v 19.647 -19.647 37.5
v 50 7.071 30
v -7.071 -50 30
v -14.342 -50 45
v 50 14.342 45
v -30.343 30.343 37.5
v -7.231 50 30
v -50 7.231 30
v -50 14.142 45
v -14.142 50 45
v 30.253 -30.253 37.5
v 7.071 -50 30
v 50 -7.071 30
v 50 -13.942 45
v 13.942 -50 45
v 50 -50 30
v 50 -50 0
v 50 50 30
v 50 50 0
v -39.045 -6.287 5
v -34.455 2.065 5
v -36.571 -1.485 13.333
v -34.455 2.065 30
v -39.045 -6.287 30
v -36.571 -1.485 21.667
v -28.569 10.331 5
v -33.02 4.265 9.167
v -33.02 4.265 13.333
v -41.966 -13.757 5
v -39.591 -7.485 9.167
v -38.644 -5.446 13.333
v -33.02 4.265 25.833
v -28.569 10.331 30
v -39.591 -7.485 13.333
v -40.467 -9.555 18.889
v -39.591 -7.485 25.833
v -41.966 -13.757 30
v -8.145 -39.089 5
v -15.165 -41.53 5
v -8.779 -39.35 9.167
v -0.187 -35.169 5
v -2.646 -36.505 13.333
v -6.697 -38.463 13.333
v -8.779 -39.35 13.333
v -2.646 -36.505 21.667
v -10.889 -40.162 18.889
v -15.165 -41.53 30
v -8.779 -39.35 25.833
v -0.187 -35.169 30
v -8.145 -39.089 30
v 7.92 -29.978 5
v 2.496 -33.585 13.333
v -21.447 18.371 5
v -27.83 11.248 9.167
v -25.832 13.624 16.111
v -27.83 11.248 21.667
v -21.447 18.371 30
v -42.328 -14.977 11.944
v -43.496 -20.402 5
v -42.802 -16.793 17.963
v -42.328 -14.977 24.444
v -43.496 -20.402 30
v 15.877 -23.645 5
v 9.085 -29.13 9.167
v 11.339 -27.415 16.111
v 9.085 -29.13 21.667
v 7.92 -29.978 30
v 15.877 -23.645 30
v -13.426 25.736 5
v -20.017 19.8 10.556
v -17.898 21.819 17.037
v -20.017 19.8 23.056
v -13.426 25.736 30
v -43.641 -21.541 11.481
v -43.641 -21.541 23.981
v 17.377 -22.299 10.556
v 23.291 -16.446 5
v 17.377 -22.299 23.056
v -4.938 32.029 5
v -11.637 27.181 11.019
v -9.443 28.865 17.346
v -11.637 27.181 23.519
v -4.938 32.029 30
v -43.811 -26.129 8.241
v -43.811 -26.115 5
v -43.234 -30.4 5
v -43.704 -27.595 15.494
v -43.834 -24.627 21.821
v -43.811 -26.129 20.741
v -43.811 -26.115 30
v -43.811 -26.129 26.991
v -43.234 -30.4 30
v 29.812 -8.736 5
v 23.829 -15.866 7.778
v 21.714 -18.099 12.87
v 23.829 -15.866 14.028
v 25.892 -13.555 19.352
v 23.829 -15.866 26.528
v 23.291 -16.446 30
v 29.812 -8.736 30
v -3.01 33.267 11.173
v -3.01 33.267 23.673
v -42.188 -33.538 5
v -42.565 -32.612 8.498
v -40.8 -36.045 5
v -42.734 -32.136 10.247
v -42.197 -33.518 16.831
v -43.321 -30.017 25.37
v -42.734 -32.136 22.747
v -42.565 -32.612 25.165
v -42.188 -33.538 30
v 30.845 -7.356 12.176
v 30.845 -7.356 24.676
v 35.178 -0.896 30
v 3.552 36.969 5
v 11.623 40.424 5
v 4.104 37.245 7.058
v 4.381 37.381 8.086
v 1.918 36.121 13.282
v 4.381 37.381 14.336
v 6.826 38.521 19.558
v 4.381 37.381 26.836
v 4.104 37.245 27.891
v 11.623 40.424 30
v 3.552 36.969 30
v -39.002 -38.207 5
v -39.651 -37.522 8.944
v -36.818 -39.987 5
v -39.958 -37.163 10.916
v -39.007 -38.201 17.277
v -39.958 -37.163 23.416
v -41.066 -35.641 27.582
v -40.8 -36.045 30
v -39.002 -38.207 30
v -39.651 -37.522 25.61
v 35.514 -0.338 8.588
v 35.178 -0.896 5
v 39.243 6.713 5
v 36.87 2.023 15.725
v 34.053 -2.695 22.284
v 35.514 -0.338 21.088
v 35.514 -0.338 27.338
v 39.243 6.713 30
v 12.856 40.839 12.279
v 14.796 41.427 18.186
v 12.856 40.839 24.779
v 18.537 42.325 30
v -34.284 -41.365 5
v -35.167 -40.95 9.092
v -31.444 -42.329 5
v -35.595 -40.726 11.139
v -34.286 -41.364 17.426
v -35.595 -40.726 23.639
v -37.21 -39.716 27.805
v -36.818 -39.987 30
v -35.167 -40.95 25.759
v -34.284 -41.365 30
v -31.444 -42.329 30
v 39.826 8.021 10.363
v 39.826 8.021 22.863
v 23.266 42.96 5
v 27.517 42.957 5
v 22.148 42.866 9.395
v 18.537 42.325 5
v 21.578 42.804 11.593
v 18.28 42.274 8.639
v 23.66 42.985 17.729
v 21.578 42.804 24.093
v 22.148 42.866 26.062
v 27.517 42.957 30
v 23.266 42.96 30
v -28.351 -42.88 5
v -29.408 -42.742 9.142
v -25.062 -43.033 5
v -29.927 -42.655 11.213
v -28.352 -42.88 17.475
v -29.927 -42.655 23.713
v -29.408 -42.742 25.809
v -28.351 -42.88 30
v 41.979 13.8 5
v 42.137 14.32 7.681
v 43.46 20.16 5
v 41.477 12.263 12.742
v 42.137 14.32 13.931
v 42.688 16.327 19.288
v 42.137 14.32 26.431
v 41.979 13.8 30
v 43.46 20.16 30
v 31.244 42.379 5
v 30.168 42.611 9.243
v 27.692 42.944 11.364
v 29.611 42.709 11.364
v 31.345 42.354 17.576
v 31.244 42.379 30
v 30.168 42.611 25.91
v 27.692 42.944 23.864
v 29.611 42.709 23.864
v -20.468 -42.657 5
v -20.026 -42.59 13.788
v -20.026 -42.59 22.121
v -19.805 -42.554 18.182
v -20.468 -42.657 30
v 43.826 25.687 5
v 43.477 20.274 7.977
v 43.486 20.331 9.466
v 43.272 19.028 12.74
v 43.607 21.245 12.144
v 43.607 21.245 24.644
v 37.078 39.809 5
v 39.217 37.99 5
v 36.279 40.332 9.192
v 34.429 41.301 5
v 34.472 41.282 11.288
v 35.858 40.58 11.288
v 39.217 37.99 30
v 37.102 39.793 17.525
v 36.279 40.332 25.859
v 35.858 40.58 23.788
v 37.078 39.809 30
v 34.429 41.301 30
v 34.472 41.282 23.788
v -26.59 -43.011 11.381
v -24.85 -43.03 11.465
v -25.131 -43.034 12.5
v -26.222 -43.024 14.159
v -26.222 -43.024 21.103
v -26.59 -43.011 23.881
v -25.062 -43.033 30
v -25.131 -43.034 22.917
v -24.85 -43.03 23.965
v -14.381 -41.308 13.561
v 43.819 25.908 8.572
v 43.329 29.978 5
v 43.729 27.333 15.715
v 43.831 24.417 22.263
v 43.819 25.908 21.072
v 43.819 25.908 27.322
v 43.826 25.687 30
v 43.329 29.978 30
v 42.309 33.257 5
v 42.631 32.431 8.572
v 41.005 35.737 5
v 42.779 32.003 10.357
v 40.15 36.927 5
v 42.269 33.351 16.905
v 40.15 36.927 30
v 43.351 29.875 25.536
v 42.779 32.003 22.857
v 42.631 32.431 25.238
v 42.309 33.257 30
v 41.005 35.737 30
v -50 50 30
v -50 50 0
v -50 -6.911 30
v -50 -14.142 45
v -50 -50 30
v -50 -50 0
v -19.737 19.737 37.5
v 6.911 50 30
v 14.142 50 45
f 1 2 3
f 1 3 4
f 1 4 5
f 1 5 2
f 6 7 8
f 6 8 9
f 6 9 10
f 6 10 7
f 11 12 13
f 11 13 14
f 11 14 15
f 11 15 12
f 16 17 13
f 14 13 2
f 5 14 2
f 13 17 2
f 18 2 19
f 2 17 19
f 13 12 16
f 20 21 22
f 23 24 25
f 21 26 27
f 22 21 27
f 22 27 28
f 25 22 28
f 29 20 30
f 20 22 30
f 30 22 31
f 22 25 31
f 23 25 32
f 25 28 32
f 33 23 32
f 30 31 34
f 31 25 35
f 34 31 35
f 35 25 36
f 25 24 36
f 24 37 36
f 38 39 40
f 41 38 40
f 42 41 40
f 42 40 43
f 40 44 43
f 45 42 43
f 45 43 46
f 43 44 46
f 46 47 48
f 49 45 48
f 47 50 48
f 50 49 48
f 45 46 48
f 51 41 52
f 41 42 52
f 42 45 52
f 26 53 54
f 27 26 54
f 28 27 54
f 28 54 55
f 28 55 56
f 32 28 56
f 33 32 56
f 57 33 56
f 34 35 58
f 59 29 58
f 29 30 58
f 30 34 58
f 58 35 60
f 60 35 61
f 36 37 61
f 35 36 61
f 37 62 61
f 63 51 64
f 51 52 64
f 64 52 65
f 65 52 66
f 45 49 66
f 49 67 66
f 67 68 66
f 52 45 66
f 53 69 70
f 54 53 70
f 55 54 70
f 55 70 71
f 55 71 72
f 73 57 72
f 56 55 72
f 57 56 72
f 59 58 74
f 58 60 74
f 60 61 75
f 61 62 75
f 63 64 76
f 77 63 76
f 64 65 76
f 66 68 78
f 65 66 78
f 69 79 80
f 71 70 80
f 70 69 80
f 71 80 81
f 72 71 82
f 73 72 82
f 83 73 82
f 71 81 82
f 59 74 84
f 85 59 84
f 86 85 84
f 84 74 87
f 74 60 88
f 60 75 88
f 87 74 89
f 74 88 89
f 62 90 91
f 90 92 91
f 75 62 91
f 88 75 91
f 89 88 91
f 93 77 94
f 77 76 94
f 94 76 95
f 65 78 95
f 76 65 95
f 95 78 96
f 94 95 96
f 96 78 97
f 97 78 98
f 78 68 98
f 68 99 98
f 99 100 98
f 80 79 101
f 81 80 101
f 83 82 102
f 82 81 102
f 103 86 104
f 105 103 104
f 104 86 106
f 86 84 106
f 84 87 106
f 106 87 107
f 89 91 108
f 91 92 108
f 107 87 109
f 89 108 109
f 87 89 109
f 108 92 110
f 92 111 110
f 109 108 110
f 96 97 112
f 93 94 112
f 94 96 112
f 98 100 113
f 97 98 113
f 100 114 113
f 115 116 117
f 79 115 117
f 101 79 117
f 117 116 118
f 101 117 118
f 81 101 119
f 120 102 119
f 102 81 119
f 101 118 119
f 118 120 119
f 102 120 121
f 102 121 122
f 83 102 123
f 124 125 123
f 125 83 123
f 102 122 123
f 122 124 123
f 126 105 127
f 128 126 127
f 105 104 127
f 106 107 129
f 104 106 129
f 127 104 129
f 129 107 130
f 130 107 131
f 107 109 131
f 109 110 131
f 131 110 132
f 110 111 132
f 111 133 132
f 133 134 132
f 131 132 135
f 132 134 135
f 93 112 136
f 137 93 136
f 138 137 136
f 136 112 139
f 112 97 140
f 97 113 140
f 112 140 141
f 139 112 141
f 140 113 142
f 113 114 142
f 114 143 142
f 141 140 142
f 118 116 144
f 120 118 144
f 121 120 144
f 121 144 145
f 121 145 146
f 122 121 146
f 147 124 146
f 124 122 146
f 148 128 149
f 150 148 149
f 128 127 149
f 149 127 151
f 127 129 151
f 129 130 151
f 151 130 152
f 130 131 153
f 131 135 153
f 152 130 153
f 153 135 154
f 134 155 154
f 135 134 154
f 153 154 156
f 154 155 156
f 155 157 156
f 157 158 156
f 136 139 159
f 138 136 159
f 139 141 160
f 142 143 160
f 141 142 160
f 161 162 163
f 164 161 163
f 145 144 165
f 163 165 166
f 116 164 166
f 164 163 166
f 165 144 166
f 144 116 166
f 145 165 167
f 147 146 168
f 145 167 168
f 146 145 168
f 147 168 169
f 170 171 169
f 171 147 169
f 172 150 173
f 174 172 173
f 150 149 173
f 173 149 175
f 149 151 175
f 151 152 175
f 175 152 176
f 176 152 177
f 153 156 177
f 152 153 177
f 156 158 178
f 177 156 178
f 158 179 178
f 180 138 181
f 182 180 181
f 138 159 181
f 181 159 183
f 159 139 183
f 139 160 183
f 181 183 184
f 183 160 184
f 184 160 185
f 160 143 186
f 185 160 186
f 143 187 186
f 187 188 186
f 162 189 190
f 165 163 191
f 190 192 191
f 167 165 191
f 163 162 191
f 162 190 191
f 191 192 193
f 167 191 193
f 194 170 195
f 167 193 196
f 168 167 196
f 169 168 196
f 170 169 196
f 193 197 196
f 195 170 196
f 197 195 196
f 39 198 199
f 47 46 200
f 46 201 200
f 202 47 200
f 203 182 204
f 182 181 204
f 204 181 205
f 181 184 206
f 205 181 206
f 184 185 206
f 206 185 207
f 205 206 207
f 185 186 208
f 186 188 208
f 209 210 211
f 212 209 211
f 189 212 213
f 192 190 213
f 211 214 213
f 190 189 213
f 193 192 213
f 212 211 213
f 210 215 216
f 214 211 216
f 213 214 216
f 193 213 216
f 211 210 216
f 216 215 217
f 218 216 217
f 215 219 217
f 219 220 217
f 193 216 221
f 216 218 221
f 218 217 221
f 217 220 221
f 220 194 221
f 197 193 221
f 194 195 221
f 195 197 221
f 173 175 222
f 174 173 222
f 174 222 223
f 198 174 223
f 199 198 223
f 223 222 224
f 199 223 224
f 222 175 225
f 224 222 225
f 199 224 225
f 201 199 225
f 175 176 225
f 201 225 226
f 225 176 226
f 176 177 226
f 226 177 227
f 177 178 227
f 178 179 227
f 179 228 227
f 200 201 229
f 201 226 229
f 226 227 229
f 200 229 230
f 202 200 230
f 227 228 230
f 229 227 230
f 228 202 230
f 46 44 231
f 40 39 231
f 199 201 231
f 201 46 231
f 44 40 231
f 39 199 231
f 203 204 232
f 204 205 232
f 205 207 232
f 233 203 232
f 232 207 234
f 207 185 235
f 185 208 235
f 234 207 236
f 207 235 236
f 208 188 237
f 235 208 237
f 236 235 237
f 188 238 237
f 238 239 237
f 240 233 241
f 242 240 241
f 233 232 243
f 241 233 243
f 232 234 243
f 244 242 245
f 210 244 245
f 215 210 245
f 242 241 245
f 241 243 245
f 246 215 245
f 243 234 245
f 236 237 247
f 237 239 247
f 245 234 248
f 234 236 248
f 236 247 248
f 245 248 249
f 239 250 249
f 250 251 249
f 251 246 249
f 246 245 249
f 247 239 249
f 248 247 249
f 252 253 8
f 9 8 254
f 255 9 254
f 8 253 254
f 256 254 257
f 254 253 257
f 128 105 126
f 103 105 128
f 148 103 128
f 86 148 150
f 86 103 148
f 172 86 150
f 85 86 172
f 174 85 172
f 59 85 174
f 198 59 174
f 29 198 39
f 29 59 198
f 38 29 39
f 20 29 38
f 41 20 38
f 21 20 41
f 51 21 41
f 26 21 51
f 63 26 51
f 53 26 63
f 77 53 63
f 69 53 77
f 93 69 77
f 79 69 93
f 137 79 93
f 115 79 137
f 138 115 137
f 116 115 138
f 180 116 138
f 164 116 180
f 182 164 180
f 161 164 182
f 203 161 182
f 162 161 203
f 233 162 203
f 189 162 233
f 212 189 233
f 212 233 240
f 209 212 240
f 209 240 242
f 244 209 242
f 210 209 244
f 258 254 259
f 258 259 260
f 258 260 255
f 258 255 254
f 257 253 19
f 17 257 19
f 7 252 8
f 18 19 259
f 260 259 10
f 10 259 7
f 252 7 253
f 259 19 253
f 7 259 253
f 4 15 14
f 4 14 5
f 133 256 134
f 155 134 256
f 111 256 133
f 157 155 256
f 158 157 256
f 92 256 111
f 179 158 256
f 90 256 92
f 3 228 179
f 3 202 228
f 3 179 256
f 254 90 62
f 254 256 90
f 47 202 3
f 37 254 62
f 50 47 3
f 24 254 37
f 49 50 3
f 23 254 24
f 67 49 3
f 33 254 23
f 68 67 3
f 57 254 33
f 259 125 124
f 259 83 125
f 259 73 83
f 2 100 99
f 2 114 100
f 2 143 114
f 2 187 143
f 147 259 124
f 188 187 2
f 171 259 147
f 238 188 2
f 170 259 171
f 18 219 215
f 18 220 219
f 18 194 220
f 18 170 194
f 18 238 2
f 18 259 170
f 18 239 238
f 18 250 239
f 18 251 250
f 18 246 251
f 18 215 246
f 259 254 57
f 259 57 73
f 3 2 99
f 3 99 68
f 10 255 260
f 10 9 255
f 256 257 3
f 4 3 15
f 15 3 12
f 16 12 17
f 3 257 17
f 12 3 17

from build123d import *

# Parameters (mm, degrees)
F1_DEPTH = 30
F8_DEPTH = 25


with BuildPart() as f1:
    # F0 (on Top) → F1 (new body)
    with BuildSketch(Plane.XY):
        Polygon((-7.231055, 50), (-50, 50), (-50, 7.231055), align=None)
        Polygon((50, -50), (50, -7.071068), (7.071068, -50), align=None)
        Polygon((50, 50), (6.91108, 50), (-46.624454, -3.535534), (-50, -6.91108), (-50, -50), (-7.071068, -50), (46.464466, 3.535534), (50, 7.071068), align=None)
        Polygon((6.91108, 50), (-7.231055, 50), (-50, 7.231055), (-50, -6.91108), (-46.624454, -3.535534), align=None)
        Polygon((50, -7.071068), (50, 7.071068), (46.464466, 3.535534), (-7.071068, -50), (7.071068, -50), align=None)
    extrude(amount=F1_DEPTH)

    # F3 (on offset) → F6 section 0
    with BuildSketch(Plane.XY.offset(30)):
        Polygon((-50, -6.911185), (6.911185, 50), (-7.23095, 50), (-50, 7.23095), align=None)
    # F5 (on offset) → F6 section 1
    with BuildSketch(Plane.XY.offset(45)):
        Polygon((14.142166, 50), (-14.142105, 50), (-50, 14.142105), (-50, -14.142166), align=None)
    loft()

    # F3 (on offset) → F7 section 0
    with BuildSketch(Plane.XY.offset(30)):
        Polygon((-7.070837, -50), (7.071298, -50), (50, -7.071298), (50, 7.070837), align=None)
    # F5 (on offset) → F7 section 1
    with BuildSketch(Plane.XY.offset(45)):
        Polygon((50, -13.942345), (50, 14.341926), (-14.341926, -50), (13.942345, -50), align=None)
    loft()

    # F3 (on offset) → F8 (cut)
    with BuildSketch(Plane.XY.offset(30)):
        with BuildLine():
            add(Edge.make_bspline(
                [(39.216664, 37.989728), (5.291793, 73.010254), (-36.570767, -1.484601), (-78.433327, -75.979456), (-2.645896, -36.505127), (73.141535, 2.969202), (39.216664, 37.989728)],
                knots=[0, 0, 0, 2.094395, 2.094395, 4.18879, 4.18879, 6.283185, 6.283185, 6.283185], degree=2, weights=[1, 0.5, 1, 0.5, 1, 0.5, 1]))
        make_face()
    extrude(amount=-F8_DEPTH, mode=Mode.SUBTRACT)


solid = f1.part
